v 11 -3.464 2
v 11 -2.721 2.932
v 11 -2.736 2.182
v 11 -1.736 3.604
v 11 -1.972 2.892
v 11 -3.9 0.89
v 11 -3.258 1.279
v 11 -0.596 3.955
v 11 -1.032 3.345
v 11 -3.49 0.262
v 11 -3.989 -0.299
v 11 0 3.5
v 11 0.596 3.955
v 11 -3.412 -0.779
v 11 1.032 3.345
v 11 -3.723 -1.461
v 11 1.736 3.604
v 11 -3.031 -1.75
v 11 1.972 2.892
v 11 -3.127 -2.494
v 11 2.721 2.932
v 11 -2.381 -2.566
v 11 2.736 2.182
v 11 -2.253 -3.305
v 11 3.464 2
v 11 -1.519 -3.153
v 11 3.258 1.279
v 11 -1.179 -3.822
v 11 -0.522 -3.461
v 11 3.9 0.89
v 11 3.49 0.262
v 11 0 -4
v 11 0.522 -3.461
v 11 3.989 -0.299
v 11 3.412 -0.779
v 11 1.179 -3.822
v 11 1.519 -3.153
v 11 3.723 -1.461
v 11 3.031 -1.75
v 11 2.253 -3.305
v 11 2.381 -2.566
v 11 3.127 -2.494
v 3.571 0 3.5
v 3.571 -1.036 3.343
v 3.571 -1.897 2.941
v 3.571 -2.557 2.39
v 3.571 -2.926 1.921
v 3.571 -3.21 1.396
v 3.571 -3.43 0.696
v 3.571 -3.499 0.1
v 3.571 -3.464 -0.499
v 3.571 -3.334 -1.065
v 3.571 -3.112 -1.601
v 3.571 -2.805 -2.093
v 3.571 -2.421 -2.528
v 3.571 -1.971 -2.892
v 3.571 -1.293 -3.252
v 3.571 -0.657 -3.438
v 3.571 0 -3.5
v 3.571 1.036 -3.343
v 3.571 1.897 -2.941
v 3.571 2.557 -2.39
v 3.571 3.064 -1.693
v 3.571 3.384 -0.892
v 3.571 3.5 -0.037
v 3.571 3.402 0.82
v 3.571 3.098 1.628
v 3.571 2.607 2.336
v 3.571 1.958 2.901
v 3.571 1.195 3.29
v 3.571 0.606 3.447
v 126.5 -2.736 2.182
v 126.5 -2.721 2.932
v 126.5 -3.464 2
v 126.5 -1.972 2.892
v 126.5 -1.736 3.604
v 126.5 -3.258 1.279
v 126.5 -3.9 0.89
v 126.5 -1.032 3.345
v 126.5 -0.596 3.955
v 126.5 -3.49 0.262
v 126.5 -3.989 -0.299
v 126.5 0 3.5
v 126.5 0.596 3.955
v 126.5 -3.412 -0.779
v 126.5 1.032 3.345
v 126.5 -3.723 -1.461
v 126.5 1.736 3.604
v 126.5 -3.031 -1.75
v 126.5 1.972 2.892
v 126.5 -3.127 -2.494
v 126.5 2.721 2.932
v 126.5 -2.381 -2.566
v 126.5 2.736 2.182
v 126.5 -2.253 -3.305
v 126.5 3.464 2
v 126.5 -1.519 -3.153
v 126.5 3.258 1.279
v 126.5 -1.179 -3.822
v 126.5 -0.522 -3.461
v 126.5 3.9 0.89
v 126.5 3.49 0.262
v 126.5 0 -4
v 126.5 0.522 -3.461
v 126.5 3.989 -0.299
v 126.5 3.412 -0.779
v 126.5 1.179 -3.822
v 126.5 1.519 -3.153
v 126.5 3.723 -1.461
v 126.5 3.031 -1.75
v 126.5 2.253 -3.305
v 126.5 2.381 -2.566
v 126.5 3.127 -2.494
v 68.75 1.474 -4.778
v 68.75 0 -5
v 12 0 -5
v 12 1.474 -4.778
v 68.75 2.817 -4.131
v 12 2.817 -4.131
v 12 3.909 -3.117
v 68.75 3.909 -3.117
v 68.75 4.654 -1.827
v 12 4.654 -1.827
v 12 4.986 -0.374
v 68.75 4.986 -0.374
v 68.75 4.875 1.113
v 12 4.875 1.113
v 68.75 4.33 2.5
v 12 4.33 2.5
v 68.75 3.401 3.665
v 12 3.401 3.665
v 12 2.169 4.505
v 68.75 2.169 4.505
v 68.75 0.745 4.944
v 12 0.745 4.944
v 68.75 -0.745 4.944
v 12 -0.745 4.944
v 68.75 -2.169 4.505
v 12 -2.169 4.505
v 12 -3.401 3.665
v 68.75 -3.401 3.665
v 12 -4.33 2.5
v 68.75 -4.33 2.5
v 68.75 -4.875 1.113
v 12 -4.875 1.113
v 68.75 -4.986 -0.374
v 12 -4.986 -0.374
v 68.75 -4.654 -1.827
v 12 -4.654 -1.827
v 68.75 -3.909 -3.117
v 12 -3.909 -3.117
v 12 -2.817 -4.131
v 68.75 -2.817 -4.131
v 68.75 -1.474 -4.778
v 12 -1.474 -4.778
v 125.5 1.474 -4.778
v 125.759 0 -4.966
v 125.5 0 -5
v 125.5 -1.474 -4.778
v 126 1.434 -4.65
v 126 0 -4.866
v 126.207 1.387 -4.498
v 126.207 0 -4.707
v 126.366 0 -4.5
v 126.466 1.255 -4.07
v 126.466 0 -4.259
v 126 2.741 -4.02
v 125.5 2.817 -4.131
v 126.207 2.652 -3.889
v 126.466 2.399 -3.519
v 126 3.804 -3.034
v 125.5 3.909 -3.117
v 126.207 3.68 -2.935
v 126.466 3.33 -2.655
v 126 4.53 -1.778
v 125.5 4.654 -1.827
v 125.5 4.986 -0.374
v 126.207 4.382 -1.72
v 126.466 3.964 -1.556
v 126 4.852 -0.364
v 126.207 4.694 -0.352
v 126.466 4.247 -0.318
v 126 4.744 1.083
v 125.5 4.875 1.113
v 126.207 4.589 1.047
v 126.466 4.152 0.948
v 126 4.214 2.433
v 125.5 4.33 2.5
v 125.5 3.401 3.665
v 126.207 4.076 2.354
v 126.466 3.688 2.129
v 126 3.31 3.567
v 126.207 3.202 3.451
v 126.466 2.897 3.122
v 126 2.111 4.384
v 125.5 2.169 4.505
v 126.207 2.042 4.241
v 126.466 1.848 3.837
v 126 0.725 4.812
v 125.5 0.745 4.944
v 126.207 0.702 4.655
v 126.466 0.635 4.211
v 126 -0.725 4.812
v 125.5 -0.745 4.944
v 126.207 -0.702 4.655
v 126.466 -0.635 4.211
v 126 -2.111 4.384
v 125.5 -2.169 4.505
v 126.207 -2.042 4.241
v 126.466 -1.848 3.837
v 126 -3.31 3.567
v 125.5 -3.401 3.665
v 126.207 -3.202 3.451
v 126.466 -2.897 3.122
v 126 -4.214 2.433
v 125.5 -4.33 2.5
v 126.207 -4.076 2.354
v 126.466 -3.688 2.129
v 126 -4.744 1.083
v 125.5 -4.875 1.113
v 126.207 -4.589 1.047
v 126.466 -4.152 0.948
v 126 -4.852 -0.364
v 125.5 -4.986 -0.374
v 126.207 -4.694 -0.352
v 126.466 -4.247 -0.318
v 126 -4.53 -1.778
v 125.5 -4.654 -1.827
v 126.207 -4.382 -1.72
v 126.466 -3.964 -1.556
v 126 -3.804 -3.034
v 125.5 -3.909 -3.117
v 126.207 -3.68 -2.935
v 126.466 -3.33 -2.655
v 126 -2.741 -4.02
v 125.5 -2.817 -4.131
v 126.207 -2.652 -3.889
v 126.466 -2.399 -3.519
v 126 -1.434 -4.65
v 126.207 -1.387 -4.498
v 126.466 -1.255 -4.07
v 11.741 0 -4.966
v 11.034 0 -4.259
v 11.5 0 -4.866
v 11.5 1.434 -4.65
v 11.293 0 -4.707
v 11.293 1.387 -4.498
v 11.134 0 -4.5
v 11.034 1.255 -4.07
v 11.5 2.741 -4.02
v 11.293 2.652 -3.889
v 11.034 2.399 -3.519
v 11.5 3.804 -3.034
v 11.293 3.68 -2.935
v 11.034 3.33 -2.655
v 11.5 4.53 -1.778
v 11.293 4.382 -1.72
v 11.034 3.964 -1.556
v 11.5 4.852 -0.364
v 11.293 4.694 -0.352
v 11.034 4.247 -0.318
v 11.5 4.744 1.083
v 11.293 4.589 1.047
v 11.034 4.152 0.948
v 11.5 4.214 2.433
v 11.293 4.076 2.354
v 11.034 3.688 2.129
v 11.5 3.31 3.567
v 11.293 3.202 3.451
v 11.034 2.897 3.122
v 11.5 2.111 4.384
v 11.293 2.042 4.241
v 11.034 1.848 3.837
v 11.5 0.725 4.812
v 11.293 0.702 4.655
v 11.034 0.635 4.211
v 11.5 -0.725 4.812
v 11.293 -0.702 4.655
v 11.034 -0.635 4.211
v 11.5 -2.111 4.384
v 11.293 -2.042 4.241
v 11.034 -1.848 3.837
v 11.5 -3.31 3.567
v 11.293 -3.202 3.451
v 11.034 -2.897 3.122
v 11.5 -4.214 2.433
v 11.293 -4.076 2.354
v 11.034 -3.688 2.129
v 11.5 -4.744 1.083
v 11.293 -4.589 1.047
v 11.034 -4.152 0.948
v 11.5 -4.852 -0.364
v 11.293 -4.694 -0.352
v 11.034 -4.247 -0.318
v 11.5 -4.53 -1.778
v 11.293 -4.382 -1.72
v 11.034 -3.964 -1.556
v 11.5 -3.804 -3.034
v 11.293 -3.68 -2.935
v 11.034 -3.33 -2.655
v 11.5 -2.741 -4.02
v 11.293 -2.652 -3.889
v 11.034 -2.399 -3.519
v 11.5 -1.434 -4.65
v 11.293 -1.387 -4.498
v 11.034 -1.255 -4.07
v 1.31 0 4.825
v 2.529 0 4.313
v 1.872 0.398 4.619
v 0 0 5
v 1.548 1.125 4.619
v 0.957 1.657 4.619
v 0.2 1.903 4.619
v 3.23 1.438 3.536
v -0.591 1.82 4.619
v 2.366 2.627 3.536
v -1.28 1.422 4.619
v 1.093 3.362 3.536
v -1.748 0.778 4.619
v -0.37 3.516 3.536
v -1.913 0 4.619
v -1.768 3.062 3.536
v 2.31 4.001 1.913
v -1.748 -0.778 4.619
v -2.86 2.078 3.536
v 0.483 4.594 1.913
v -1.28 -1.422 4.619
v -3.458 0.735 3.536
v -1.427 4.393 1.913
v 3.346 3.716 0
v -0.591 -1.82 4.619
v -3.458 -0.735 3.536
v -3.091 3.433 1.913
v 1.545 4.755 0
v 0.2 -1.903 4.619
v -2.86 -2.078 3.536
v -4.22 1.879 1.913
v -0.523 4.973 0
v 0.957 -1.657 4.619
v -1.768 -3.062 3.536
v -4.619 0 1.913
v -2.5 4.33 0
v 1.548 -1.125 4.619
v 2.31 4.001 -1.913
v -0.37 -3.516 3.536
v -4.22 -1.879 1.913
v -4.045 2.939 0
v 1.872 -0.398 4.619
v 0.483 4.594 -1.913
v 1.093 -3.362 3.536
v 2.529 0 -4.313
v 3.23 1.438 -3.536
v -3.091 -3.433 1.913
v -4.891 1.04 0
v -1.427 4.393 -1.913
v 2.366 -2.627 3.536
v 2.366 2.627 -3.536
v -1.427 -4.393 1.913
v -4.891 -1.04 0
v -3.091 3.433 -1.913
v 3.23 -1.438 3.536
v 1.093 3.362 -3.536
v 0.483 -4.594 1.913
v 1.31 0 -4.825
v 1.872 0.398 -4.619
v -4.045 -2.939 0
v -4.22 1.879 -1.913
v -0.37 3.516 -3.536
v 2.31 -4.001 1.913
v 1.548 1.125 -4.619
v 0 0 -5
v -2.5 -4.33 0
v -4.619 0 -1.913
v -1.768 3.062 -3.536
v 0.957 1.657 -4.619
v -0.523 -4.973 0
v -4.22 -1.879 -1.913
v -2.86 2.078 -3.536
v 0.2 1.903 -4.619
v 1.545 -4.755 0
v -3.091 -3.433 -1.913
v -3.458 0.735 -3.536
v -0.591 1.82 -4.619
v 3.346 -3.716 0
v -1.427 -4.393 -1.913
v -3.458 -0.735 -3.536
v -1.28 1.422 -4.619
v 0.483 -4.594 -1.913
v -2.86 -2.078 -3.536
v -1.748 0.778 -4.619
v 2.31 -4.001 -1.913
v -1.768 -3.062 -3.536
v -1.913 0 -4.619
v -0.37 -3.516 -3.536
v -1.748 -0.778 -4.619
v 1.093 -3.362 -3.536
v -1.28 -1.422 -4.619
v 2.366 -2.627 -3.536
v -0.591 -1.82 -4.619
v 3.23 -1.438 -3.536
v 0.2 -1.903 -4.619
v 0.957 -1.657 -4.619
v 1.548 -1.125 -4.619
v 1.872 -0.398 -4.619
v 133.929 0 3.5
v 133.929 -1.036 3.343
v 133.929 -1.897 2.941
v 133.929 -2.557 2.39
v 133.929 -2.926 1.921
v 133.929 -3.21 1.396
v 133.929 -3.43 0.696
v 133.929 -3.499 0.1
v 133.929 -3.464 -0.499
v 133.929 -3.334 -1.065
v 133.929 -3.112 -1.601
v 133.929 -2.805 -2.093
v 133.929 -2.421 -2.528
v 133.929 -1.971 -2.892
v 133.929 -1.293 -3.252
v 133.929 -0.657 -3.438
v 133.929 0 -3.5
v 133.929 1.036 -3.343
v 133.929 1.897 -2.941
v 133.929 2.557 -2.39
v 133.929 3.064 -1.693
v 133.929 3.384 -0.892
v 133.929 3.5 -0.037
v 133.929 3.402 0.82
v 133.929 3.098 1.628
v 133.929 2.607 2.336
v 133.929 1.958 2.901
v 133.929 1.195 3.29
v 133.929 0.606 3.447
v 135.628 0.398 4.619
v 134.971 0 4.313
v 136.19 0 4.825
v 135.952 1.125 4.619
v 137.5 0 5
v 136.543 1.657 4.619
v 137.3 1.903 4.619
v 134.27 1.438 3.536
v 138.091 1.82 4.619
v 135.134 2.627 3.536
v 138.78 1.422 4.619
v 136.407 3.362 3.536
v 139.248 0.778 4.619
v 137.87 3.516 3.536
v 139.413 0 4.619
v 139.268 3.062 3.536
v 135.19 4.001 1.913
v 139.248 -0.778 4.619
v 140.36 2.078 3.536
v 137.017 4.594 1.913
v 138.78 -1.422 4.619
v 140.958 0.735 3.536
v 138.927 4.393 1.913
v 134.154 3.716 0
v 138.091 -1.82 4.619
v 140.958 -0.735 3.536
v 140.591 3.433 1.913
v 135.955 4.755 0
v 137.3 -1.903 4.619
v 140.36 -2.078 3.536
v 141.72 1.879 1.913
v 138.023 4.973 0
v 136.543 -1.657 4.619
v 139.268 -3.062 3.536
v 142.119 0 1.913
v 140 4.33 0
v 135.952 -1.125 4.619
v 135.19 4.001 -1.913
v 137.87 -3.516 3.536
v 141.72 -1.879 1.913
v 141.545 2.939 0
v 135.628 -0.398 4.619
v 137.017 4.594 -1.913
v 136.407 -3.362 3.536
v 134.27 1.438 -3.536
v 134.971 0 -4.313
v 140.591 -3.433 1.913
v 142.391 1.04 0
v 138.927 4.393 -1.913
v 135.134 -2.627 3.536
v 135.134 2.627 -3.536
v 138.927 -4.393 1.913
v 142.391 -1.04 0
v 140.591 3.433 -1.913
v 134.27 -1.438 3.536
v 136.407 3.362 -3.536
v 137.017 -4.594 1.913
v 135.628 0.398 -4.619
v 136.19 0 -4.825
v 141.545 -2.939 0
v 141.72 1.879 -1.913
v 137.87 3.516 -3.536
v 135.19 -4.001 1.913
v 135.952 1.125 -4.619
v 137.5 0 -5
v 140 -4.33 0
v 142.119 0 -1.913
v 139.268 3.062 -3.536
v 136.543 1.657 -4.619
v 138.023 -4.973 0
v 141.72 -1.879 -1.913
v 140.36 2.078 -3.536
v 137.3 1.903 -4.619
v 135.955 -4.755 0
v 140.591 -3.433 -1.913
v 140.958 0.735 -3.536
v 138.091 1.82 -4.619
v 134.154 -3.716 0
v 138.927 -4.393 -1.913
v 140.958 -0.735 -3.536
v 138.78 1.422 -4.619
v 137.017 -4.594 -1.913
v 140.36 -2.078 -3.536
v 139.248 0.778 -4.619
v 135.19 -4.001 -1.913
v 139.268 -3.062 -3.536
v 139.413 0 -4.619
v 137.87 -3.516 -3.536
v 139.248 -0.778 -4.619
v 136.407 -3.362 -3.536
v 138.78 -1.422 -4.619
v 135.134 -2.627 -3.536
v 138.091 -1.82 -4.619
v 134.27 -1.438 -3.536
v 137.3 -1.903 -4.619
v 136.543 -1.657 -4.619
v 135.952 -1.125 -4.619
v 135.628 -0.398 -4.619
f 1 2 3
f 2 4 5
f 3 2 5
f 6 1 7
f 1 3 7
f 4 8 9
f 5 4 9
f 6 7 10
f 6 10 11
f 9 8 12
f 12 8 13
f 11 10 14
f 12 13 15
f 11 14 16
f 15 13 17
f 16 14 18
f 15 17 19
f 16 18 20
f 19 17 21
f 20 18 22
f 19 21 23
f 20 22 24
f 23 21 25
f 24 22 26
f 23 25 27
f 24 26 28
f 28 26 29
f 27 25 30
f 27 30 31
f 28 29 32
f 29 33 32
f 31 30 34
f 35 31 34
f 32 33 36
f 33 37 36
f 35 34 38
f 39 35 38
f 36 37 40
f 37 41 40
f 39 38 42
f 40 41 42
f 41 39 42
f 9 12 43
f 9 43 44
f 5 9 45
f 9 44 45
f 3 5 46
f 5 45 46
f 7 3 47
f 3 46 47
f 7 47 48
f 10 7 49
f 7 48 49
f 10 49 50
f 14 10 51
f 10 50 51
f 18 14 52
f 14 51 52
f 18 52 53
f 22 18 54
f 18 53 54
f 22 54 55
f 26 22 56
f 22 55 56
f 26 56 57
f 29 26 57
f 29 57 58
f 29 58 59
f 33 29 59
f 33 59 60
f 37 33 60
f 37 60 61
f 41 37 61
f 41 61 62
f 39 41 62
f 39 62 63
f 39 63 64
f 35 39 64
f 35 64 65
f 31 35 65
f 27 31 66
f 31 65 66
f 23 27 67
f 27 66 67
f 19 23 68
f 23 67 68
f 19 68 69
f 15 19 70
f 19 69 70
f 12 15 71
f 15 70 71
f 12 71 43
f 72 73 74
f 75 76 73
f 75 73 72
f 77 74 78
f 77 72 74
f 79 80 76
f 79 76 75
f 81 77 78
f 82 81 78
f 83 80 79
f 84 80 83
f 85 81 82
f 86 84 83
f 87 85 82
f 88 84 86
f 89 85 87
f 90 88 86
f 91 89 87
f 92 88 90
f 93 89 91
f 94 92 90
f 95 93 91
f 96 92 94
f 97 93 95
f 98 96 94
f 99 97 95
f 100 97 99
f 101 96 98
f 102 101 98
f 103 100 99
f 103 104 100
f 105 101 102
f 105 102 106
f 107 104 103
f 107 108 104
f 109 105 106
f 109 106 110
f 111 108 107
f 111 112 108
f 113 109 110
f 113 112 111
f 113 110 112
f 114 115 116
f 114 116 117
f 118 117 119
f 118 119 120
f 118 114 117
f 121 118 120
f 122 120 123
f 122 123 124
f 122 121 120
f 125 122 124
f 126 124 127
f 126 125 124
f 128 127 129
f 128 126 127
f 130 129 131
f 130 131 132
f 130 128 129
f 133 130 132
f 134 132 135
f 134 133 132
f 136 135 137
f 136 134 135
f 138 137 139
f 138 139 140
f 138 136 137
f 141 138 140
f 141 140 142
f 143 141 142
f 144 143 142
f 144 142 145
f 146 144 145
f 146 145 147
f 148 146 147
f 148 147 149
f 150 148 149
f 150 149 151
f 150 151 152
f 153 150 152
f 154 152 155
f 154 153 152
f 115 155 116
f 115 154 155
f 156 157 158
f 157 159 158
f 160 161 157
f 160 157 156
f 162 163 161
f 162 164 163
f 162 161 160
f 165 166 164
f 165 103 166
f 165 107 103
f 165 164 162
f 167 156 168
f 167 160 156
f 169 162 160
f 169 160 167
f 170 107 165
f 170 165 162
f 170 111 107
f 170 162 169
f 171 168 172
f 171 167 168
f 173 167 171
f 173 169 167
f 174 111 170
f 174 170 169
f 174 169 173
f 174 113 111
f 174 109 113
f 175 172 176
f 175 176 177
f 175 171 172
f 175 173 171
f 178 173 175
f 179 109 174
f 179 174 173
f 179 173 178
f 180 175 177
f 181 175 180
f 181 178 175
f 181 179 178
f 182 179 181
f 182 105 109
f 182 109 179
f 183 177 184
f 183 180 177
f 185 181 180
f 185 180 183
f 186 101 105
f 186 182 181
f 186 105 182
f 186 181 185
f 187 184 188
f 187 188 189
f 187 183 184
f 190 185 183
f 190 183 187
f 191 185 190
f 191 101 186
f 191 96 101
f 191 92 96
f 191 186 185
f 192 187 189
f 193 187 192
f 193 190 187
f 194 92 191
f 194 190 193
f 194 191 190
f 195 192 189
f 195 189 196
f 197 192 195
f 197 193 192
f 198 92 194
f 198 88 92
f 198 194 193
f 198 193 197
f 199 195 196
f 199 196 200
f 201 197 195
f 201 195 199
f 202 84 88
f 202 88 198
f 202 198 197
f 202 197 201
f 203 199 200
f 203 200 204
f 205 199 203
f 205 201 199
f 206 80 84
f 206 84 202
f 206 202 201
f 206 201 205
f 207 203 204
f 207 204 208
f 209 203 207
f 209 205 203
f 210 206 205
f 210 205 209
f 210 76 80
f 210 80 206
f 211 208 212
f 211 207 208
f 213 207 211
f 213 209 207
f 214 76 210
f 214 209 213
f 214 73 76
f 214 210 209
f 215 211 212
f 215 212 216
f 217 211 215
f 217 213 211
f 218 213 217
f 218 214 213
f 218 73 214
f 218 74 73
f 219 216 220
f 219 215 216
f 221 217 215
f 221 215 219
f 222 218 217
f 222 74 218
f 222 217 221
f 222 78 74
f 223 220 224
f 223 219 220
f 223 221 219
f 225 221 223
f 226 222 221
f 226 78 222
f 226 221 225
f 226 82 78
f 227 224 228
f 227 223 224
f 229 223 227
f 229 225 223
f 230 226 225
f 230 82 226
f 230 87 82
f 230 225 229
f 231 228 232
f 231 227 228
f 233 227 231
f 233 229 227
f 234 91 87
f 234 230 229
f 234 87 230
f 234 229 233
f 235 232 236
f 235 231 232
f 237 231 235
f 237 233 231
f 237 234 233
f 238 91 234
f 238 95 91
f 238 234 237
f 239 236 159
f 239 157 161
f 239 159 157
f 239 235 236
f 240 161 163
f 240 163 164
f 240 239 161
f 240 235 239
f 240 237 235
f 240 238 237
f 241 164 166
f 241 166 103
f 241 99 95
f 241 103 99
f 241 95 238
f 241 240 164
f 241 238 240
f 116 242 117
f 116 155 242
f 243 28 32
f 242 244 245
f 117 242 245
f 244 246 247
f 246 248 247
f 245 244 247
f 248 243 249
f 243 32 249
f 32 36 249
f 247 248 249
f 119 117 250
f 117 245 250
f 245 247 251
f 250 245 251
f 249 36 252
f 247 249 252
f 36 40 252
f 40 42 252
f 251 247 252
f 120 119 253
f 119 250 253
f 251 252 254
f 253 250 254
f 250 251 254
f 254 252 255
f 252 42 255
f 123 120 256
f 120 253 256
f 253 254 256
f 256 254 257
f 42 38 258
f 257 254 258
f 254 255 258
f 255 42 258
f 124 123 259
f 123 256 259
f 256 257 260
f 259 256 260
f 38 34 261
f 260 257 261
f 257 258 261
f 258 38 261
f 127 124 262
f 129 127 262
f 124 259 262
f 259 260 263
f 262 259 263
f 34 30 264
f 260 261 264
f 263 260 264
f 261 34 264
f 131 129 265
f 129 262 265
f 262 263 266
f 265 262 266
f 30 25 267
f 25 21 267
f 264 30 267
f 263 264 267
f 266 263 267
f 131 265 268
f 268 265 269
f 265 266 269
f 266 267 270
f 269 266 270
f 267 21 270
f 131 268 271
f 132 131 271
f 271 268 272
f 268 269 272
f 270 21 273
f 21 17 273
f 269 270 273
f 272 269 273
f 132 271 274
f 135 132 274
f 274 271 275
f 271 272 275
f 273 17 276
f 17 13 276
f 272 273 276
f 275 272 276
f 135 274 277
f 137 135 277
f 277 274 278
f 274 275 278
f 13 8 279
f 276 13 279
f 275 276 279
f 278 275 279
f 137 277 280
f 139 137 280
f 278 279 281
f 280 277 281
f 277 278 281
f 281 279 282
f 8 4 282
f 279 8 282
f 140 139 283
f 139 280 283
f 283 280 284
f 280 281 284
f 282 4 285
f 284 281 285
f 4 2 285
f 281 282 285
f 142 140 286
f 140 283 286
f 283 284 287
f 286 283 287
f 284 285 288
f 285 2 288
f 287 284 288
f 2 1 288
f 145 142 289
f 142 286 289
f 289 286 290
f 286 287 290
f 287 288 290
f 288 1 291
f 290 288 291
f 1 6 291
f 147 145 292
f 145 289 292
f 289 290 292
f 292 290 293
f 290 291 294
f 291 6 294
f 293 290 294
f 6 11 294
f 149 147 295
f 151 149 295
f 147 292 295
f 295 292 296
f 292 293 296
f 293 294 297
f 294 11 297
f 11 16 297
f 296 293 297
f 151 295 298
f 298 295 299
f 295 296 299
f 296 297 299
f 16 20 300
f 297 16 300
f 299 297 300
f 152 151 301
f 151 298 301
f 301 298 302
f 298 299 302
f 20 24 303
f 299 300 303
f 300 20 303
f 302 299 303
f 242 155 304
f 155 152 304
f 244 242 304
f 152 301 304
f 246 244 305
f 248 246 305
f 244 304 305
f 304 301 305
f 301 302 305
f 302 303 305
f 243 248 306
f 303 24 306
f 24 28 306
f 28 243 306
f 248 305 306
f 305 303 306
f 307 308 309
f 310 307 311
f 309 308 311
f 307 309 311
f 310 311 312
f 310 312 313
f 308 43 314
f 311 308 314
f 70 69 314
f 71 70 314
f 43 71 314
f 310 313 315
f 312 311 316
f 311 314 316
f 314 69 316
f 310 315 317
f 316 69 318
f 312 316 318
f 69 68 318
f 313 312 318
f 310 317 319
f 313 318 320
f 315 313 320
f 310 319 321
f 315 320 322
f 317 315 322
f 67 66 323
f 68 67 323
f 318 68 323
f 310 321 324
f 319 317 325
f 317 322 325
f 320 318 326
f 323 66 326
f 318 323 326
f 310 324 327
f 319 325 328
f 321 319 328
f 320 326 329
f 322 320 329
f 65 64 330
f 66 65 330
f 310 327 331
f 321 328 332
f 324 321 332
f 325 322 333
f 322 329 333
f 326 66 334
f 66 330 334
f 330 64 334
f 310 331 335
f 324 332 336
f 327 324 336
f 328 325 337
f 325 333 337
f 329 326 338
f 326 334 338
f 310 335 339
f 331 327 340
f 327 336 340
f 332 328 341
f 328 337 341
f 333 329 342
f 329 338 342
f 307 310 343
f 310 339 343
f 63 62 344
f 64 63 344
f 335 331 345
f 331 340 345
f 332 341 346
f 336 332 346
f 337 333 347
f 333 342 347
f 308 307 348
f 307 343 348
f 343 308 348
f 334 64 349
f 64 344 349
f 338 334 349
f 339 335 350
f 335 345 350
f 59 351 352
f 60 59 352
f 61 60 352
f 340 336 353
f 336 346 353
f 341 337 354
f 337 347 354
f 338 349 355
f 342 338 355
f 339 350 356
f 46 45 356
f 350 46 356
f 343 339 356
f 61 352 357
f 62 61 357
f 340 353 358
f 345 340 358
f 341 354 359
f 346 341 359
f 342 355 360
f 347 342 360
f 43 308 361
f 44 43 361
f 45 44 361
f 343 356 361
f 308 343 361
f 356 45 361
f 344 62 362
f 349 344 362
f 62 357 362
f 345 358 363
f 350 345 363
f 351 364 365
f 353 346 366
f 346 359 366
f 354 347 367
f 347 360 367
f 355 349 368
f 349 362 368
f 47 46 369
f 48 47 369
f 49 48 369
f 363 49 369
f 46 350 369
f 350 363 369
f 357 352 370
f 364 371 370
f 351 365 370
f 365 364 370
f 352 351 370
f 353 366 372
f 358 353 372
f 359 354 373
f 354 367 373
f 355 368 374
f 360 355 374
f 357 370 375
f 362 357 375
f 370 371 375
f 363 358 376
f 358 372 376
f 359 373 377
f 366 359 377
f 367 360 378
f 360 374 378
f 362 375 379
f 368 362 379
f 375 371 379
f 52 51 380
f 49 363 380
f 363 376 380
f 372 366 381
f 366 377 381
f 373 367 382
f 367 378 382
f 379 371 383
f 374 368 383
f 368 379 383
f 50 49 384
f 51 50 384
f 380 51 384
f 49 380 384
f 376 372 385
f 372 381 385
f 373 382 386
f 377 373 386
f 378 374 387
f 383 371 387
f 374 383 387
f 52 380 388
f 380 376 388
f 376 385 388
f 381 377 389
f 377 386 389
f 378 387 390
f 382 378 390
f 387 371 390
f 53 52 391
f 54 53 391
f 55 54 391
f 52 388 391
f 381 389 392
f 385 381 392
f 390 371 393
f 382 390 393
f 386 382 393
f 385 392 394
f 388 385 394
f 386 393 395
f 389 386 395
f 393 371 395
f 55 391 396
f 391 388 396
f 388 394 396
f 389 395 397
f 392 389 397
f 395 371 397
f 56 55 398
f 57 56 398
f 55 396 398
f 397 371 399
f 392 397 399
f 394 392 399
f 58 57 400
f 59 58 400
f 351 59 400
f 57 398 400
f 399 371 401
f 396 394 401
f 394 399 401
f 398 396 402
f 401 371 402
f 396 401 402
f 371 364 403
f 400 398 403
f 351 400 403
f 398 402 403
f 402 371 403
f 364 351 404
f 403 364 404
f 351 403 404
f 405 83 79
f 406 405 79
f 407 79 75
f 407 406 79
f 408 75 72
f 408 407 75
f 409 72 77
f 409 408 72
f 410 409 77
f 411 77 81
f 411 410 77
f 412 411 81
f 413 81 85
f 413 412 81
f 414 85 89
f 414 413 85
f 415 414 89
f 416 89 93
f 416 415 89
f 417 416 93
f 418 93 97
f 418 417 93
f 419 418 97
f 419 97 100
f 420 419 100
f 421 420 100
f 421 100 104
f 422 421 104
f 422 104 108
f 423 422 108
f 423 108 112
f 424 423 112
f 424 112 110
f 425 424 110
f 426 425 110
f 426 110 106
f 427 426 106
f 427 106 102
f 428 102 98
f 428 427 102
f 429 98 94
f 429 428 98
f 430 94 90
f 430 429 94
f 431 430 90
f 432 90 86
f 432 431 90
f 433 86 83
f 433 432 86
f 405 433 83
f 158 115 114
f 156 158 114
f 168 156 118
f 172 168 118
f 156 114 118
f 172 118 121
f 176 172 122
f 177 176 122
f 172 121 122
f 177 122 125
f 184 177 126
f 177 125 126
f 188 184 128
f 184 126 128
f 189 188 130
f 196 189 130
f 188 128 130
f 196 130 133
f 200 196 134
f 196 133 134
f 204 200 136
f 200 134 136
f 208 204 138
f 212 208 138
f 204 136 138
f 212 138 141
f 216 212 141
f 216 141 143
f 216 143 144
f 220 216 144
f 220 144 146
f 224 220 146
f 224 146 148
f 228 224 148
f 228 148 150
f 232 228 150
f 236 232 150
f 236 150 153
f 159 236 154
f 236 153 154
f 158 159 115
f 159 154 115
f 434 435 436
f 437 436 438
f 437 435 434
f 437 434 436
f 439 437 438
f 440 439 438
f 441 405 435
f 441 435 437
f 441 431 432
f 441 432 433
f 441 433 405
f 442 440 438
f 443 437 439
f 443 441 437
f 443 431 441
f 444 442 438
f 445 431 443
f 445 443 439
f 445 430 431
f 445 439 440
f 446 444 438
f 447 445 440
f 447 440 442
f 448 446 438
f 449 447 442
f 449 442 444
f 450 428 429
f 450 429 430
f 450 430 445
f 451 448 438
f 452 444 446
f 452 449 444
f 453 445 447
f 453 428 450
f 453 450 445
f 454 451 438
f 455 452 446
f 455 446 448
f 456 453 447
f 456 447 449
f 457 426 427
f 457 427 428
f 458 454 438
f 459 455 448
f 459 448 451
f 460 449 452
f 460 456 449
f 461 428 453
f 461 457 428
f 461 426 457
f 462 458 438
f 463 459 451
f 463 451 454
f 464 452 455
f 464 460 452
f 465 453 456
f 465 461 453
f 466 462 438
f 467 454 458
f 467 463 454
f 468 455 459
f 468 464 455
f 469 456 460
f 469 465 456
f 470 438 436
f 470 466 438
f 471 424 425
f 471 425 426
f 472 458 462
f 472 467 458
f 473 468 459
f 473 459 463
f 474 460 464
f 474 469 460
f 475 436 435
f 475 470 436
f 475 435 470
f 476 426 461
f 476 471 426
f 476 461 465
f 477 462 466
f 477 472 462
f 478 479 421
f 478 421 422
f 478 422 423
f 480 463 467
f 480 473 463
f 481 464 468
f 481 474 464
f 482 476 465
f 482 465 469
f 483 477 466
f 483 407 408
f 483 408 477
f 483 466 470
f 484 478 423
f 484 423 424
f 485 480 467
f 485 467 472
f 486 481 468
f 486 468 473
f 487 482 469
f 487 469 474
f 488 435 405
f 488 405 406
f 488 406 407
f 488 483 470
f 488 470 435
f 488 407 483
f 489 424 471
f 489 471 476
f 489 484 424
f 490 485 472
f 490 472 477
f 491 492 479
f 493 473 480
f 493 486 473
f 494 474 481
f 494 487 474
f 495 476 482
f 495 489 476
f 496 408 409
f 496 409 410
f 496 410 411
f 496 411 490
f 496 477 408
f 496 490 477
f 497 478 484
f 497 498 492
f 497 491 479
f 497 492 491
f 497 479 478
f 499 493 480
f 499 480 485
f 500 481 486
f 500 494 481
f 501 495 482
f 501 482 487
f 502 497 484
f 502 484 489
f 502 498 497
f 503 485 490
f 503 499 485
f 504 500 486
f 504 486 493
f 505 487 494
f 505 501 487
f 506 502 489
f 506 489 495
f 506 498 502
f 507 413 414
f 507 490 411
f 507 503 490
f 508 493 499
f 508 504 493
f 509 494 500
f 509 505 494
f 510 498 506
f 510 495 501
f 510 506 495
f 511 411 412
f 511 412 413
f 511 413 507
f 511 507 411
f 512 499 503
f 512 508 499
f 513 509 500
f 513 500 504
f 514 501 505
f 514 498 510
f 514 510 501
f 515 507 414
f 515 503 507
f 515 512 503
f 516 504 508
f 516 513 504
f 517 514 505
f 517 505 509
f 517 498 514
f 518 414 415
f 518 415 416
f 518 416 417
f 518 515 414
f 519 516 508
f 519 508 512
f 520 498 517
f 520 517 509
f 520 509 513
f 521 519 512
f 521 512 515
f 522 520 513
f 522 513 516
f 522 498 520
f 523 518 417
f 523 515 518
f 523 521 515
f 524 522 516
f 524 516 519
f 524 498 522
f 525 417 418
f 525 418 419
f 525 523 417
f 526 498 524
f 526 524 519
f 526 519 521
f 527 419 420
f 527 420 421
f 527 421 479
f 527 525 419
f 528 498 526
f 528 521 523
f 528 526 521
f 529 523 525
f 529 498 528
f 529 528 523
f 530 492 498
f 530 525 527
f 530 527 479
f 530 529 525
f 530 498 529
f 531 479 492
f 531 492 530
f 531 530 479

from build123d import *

# Parameters (mm, degrees)
SKETCH2_R           = 3.5
BOSS_EXTRUDE1_DEPTH = 68.75
SKETCH3_R           = 5
BOSS_EXTRUDE2_DEPTH = 57.75
FILLET1_R           = 1


with BuildPart() as part:
    # Sketch1 → Revolve1 (revolve)
    with BuildSketch(Plane(origin=(0, 0, 0), x_dir=(1, 0, 0), z_dir=(0, 1, 0))):
        with BuildLine():
            Line((0, 5), (0, -5))
            ThreePointArc((0, -5), (5, 0), (0, 5))
        make_face()
    revolve(axis=Axis((0, 0, -5), (0, 0, 1)))

    # Sketch2 → Boss-Extrude1 (add)
    with BuildSketch(Plane(origin=(0, 0, 0), x_dir=(0, 0, -1), z_dir=(1, 0, 0))):
        with Locations(Location((0, 0, 0), (0, 0, 180))):
            Circle(SKETCH2_R)
    extrude(amount=BOSS_EXTRUDE1_DEPTH)

    # Sketch3 → Boss-Extrude2 (add)
    with BuildSketch(Plane(origin=(68.75, 0, 0), x_dir=(0, 0, -1), z_dir=(1, 0, 0))):
        Circle(SKETCH3_R)
    extrude(amount=-BOSS_EXTRUDE2_DEPTH)

    # Fillet1
    fillet1_edges = [part.edges().sort_by_distance(p)[0] for p in [
        (11, 0, 5),
    ]]
    fillet(fillet1_edges, radius=FILLET1_R)

    # Mirror1: part across face


with BuildPart() as part_1:
    add(part.part)
    add(part.part.mirror(Plane(origin=(68.75, 0, 0), x_dir=(0, 0, 1), z_dir=(1, 0, 0))))


solid = part_1.part
